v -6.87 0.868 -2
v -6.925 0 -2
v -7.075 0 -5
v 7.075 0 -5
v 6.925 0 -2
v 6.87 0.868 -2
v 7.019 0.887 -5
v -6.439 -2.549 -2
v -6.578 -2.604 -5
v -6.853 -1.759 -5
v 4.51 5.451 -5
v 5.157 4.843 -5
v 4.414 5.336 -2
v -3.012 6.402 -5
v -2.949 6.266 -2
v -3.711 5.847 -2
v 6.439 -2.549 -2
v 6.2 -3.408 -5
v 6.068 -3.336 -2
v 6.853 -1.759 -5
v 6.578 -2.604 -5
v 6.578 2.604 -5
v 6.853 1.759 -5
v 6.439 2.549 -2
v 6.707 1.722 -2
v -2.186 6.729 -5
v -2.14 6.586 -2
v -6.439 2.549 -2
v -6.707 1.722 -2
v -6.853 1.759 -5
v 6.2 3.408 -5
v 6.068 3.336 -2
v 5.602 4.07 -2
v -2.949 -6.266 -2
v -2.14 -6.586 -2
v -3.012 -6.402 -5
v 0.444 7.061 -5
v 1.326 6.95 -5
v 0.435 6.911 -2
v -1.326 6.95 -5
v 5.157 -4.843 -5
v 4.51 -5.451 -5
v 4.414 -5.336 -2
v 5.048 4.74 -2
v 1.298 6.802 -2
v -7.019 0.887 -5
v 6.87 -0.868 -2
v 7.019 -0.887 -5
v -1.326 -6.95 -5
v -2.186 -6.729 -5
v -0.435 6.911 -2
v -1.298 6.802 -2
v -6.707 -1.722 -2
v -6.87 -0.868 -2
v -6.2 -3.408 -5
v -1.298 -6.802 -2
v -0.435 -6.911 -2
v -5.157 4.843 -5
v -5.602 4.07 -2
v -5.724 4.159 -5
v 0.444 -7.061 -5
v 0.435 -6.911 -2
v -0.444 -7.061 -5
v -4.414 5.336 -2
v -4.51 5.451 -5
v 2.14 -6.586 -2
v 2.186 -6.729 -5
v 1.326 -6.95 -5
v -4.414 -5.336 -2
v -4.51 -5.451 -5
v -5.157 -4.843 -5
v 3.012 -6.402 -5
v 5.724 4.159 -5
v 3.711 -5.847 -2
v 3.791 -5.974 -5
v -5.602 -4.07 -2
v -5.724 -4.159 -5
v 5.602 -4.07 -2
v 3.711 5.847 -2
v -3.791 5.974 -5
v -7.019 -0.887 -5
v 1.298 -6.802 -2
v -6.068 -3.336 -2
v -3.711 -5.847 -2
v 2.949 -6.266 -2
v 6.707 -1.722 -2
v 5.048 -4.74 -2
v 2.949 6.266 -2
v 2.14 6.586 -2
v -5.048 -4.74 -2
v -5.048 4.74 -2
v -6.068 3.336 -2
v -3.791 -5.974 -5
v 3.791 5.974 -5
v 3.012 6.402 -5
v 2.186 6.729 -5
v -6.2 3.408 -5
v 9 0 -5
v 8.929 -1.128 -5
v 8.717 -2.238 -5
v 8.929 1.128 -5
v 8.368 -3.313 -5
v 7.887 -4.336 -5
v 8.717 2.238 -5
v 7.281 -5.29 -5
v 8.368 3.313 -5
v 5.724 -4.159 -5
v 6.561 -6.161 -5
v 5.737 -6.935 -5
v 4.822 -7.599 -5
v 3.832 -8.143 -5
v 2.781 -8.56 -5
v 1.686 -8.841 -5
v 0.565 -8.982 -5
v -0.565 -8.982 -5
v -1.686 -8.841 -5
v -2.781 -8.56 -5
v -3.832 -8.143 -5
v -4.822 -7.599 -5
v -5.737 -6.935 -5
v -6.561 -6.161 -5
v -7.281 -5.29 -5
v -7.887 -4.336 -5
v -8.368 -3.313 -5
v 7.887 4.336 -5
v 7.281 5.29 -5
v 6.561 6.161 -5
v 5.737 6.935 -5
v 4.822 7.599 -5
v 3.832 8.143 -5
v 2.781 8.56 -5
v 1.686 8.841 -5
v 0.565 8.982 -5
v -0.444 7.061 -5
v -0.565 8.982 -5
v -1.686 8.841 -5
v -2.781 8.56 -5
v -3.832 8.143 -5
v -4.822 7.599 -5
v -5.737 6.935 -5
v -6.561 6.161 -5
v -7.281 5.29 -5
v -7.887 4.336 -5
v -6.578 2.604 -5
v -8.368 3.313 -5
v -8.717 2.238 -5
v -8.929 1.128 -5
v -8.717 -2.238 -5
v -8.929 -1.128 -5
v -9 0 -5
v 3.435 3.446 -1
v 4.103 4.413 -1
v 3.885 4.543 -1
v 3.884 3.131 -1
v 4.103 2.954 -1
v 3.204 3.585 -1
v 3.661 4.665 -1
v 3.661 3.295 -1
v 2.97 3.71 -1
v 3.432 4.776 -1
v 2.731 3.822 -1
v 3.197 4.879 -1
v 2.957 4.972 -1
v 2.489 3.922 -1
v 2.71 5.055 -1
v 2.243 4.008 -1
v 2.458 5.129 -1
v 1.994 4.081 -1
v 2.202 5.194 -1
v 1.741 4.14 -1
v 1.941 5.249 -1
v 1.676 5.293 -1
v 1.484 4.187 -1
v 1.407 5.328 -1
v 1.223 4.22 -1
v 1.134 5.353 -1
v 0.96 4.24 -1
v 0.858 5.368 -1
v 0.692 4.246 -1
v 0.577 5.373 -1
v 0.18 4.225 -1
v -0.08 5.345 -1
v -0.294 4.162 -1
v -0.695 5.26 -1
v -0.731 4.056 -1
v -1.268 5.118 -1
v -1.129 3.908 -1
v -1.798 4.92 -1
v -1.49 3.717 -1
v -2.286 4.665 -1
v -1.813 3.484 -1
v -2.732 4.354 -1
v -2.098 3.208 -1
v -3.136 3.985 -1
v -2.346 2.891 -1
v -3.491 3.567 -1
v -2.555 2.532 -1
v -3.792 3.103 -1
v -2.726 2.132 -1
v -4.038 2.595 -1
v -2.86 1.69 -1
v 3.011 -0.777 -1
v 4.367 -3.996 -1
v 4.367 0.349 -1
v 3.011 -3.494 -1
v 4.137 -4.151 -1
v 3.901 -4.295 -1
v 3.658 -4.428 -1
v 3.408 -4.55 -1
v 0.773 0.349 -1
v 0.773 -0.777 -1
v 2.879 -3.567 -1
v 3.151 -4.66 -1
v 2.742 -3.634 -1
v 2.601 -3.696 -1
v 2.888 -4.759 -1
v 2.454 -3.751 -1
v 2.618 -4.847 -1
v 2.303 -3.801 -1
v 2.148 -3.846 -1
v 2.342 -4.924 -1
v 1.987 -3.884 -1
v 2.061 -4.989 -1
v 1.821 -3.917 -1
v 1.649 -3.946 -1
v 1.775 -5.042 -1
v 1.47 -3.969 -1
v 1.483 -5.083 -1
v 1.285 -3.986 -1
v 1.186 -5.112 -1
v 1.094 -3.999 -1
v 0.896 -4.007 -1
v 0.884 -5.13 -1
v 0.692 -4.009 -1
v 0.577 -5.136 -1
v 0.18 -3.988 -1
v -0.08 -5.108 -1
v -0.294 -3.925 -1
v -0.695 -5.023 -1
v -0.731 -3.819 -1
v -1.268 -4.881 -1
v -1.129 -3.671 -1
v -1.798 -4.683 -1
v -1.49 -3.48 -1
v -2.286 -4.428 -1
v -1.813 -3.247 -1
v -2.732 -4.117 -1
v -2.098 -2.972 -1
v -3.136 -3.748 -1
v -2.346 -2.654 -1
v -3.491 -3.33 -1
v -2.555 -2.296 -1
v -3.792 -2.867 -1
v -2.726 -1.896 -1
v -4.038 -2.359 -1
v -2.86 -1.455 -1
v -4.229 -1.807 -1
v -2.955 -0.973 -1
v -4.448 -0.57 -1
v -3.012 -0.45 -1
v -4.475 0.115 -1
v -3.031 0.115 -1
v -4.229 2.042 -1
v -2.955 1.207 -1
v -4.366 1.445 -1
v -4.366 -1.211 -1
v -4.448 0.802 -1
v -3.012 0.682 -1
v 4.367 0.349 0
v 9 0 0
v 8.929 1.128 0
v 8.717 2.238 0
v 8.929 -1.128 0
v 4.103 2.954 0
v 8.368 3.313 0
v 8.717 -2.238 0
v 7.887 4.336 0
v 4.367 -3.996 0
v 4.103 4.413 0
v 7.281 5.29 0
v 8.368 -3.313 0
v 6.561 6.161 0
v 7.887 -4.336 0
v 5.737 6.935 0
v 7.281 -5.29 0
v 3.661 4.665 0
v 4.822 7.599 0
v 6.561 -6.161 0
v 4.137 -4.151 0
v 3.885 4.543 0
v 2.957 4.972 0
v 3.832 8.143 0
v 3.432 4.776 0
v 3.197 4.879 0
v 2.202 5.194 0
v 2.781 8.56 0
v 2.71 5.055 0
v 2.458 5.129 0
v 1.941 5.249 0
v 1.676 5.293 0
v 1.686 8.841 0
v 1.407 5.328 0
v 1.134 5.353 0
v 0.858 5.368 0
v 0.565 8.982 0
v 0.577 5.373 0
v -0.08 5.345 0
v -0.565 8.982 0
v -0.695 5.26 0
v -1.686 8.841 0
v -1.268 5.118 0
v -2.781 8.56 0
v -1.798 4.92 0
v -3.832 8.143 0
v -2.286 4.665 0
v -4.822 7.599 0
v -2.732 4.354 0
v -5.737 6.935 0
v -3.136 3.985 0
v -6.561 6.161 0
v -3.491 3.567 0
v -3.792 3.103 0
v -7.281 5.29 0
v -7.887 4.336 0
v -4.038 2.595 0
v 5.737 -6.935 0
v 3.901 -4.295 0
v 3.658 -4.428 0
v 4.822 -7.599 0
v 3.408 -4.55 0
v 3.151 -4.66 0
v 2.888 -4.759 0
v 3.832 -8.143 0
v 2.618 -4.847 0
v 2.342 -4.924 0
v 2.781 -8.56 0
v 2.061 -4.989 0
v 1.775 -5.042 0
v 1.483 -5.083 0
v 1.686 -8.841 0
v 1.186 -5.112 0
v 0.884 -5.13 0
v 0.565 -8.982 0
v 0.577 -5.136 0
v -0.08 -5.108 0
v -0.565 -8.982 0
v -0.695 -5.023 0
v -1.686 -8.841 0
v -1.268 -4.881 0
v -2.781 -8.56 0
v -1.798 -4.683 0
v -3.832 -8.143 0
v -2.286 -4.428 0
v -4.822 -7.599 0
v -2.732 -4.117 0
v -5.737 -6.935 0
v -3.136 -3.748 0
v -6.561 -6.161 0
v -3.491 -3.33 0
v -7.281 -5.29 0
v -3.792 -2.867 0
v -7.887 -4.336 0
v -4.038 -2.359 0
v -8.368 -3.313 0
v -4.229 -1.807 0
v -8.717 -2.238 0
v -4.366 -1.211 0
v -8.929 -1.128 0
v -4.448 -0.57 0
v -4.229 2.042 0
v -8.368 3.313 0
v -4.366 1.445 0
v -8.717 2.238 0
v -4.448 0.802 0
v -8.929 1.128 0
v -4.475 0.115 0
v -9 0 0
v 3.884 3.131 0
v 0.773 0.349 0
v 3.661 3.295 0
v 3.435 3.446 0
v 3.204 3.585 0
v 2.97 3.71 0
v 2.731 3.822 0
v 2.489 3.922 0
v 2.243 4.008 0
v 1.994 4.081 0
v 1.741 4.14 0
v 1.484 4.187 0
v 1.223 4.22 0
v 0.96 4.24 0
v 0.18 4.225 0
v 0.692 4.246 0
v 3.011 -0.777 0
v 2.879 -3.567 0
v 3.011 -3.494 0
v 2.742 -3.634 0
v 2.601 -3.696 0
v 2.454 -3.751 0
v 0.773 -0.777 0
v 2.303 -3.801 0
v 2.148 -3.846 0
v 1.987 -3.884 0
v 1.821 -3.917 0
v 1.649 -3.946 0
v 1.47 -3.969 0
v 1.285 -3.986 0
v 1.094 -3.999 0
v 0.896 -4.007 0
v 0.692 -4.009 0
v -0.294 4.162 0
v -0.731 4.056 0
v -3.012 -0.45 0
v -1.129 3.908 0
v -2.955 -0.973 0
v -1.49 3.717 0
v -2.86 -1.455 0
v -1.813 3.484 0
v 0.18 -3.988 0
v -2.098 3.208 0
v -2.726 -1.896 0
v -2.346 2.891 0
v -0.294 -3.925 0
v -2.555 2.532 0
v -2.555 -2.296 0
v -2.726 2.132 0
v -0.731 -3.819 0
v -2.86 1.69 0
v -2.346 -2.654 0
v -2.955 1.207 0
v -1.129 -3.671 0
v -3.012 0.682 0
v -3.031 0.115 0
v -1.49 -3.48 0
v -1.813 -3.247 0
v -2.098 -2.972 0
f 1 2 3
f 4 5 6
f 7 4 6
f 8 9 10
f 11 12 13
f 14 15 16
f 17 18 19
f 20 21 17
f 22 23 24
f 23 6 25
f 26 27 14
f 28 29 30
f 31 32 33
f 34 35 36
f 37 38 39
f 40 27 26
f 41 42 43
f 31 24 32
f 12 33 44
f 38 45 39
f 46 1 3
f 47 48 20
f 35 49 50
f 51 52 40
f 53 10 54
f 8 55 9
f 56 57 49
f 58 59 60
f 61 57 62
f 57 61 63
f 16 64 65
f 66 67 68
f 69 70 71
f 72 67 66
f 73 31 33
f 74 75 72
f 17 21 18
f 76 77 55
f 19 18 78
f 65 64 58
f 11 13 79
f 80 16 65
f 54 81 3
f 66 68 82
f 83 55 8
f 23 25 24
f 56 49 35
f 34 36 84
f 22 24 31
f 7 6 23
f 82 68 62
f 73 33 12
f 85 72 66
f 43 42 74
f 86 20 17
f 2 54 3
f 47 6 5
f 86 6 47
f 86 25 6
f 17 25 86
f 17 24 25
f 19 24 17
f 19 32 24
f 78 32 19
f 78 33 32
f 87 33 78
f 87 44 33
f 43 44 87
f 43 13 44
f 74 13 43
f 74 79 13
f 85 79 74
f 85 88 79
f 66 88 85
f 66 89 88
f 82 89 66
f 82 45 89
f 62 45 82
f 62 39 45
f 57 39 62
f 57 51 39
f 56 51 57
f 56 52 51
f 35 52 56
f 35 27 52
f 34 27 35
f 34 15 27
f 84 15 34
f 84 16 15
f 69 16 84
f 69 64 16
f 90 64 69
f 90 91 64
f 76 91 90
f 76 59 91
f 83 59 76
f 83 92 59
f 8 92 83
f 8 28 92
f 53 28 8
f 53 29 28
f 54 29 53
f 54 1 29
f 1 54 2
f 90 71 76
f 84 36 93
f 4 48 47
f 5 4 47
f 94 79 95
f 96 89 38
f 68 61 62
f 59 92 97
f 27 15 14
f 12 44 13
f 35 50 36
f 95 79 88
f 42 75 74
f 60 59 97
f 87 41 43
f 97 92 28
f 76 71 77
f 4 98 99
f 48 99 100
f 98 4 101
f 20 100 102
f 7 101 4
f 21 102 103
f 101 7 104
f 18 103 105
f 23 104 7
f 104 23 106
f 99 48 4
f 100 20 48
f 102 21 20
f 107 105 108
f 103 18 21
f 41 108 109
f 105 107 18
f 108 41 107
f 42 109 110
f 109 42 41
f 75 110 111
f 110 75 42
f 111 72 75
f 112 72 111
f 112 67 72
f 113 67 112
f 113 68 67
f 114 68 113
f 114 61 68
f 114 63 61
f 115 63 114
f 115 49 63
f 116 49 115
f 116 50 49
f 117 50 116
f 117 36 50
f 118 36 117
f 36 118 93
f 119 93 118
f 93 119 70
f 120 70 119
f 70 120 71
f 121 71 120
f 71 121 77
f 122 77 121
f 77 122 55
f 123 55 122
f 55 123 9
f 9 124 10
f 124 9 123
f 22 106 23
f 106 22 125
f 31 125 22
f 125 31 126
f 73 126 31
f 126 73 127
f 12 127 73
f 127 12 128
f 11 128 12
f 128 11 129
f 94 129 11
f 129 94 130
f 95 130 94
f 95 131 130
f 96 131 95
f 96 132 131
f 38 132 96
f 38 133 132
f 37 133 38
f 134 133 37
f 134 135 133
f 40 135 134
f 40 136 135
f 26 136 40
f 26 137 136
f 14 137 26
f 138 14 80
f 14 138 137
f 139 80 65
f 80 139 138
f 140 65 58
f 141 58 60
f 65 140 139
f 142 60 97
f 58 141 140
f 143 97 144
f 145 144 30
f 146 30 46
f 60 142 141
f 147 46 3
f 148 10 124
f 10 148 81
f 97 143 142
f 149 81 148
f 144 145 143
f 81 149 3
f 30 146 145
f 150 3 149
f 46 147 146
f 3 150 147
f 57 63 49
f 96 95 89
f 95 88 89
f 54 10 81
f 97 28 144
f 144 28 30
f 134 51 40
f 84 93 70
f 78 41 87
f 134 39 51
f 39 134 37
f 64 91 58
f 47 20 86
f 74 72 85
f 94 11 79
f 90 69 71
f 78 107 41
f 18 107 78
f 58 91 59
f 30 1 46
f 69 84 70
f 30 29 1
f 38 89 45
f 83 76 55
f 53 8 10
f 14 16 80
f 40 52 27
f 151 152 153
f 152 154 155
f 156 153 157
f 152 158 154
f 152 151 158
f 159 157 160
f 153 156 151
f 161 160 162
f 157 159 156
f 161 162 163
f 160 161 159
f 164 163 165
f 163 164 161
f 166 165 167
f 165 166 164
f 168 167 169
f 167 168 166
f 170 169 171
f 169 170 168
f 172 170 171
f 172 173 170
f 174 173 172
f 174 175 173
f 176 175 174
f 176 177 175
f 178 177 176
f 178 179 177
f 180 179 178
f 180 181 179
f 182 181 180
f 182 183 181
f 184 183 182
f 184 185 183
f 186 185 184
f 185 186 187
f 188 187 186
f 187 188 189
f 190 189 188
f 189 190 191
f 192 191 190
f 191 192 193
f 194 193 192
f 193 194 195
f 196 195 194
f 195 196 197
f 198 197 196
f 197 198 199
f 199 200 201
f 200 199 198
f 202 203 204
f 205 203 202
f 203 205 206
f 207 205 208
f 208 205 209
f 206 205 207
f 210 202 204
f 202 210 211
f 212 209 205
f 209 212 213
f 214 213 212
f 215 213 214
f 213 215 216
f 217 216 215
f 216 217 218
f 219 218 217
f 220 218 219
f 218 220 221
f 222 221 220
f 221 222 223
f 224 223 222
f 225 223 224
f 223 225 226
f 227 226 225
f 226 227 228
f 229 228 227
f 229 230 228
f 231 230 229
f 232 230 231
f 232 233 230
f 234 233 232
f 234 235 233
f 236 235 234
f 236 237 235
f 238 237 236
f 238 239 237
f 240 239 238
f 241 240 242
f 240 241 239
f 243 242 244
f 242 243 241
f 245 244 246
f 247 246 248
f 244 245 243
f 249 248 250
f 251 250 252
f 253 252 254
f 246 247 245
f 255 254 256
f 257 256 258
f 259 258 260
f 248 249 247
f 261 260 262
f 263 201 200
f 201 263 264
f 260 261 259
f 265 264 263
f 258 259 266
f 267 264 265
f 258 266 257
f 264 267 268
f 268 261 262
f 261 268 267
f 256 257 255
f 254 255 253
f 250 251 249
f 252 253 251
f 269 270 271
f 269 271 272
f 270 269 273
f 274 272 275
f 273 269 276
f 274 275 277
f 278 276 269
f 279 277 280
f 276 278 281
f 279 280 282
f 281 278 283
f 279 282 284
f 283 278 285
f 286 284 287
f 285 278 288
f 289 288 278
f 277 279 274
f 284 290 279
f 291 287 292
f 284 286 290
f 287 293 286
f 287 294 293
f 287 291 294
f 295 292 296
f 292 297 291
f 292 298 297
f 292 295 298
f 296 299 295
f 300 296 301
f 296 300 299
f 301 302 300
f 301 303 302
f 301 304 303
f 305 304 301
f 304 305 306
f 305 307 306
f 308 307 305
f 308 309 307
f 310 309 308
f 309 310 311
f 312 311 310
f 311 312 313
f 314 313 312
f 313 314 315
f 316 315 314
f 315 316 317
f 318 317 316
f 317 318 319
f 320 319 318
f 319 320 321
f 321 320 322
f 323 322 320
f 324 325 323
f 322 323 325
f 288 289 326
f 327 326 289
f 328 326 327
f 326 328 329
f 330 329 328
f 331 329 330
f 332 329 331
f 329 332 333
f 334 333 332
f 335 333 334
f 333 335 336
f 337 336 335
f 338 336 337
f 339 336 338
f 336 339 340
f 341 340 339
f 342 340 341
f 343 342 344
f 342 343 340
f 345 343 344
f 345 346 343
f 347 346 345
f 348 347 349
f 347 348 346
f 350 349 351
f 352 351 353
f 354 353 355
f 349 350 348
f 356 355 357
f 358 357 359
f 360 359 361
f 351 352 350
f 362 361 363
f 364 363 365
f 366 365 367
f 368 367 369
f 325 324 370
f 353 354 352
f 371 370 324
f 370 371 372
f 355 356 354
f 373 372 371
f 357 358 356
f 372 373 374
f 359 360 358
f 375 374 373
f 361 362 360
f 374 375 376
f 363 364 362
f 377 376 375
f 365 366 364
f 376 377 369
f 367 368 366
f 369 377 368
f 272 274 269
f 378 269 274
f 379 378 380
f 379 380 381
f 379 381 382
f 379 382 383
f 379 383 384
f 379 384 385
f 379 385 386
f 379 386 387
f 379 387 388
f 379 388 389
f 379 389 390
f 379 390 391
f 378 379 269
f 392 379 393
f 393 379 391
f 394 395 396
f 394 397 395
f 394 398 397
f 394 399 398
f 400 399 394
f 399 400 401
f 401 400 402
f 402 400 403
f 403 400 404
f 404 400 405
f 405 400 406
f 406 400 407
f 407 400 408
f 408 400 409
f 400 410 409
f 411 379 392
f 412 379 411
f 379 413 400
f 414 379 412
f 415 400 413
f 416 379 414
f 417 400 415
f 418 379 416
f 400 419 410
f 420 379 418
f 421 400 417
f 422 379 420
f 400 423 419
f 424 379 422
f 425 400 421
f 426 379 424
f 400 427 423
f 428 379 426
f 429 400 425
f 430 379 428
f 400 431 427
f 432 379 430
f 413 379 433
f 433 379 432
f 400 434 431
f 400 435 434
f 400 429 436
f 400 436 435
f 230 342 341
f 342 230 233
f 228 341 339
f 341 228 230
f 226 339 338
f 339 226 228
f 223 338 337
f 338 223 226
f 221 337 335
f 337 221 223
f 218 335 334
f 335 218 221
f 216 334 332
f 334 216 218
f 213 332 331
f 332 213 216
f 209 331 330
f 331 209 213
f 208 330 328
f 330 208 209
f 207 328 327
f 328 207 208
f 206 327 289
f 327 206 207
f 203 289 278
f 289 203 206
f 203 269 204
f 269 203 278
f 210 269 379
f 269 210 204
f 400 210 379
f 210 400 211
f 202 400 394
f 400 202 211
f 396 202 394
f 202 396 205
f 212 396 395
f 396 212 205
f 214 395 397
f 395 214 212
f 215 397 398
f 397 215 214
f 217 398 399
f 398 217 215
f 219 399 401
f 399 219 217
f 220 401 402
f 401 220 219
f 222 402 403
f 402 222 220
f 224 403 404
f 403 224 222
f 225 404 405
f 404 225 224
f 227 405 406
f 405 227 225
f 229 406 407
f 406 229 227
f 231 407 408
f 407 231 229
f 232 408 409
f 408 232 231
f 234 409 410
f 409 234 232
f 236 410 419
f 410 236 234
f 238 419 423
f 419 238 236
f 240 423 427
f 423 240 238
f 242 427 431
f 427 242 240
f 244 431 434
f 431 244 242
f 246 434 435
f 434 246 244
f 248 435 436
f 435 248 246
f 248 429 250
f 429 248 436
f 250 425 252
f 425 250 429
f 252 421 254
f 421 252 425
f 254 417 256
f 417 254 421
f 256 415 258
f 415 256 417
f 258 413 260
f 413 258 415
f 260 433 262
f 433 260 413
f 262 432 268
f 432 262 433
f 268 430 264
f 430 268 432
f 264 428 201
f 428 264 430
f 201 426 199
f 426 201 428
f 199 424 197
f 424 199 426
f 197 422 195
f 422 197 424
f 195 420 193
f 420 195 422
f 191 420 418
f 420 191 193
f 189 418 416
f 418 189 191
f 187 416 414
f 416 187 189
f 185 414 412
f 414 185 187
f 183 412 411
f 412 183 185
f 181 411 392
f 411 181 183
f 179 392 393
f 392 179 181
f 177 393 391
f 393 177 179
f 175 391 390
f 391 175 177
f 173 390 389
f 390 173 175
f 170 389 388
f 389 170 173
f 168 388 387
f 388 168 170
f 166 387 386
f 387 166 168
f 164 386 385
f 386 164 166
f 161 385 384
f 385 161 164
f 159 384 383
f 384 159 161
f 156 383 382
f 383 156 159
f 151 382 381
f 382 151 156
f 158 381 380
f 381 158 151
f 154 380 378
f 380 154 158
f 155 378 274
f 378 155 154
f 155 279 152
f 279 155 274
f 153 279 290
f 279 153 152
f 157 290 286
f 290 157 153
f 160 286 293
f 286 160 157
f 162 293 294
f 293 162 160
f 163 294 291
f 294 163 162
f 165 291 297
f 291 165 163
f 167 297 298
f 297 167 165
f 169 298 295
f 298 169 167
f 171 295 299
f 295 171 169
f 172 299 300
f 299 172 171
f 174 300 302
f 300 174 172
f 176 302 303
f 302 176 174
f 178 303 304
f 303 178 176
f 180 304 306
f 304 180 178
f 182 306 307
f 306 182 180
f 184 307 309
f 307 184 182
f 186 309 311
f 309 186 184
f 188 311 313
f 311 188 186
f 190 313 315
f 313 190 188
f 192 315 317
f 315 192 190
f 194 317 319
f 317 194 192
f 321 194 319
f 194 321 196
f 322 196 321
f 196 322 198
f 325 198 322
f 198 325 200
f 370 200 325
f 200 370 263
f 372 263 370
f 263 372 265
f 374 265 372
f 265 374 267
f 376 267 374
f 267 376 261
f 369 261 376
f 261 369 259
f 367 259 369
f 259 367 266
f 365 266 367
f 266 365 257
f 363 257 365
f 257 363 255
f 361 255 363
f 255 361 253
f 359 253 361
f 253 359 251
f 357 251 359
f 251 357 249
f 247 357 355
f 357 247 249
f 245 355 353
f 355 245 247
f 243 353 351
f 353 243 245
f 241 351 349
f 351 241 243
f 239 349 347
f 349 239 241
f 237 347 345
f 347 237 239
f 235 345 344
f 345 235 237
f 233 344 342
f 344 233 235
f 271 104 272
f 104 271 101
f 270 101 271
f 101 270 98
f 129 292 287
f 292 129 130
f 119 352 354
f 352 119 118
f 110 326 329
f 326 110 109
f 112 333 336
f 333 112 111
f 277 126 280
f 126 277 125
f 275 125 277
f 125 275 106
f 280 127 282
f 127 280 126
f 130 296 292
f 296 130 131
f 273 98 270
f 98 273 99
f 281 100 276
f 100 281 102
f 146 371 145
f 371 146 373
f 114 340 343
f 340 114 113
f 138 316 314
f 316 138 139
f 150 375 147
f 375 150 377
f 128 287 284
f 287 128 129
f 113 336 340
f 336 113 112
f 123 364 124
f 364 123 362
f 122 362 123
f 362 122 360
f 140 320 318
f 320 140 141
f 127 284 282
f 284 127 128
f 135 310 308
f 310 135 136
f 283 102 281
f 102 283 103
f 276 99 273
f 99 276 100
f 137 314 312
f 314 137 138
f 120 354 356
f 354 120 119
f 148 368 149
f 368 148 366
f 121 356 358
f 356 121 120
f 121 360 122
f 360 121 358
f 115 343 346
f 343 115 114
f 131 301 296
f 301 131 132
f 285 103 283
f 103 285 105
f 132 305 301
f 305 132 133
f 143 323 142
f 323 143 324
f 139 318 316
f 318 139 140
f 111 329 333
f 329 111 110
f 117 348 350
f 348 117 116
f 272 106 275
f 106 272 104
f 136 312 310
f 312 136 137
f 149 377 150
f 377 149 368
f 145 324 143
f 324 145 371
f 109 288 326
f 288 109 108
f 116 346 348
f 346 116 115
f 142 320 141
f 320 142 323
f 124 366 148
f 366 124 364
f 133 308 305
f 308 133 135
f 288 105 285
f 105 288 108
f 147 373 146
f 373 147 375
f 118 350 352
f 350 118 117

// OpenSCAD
$fn = 50;

difference() {
	union() {
		translate(v = [0, 0, -5.0]) {
			cylinder(h = 5, r = 9.0);
		}
	}
	union() {
		#translate(v = [0, 0, -5.0]) {
			cylinder(h = 3, r1 = 7.075, r2 = 6.925);
		}
		translate(v = [0, 0, -1]) {
			linear_extrude(height = 1) {
				text(font = "Impact", halign = "center", size = 10, text = "G", valign = "center");
			}
		}
	}
}
